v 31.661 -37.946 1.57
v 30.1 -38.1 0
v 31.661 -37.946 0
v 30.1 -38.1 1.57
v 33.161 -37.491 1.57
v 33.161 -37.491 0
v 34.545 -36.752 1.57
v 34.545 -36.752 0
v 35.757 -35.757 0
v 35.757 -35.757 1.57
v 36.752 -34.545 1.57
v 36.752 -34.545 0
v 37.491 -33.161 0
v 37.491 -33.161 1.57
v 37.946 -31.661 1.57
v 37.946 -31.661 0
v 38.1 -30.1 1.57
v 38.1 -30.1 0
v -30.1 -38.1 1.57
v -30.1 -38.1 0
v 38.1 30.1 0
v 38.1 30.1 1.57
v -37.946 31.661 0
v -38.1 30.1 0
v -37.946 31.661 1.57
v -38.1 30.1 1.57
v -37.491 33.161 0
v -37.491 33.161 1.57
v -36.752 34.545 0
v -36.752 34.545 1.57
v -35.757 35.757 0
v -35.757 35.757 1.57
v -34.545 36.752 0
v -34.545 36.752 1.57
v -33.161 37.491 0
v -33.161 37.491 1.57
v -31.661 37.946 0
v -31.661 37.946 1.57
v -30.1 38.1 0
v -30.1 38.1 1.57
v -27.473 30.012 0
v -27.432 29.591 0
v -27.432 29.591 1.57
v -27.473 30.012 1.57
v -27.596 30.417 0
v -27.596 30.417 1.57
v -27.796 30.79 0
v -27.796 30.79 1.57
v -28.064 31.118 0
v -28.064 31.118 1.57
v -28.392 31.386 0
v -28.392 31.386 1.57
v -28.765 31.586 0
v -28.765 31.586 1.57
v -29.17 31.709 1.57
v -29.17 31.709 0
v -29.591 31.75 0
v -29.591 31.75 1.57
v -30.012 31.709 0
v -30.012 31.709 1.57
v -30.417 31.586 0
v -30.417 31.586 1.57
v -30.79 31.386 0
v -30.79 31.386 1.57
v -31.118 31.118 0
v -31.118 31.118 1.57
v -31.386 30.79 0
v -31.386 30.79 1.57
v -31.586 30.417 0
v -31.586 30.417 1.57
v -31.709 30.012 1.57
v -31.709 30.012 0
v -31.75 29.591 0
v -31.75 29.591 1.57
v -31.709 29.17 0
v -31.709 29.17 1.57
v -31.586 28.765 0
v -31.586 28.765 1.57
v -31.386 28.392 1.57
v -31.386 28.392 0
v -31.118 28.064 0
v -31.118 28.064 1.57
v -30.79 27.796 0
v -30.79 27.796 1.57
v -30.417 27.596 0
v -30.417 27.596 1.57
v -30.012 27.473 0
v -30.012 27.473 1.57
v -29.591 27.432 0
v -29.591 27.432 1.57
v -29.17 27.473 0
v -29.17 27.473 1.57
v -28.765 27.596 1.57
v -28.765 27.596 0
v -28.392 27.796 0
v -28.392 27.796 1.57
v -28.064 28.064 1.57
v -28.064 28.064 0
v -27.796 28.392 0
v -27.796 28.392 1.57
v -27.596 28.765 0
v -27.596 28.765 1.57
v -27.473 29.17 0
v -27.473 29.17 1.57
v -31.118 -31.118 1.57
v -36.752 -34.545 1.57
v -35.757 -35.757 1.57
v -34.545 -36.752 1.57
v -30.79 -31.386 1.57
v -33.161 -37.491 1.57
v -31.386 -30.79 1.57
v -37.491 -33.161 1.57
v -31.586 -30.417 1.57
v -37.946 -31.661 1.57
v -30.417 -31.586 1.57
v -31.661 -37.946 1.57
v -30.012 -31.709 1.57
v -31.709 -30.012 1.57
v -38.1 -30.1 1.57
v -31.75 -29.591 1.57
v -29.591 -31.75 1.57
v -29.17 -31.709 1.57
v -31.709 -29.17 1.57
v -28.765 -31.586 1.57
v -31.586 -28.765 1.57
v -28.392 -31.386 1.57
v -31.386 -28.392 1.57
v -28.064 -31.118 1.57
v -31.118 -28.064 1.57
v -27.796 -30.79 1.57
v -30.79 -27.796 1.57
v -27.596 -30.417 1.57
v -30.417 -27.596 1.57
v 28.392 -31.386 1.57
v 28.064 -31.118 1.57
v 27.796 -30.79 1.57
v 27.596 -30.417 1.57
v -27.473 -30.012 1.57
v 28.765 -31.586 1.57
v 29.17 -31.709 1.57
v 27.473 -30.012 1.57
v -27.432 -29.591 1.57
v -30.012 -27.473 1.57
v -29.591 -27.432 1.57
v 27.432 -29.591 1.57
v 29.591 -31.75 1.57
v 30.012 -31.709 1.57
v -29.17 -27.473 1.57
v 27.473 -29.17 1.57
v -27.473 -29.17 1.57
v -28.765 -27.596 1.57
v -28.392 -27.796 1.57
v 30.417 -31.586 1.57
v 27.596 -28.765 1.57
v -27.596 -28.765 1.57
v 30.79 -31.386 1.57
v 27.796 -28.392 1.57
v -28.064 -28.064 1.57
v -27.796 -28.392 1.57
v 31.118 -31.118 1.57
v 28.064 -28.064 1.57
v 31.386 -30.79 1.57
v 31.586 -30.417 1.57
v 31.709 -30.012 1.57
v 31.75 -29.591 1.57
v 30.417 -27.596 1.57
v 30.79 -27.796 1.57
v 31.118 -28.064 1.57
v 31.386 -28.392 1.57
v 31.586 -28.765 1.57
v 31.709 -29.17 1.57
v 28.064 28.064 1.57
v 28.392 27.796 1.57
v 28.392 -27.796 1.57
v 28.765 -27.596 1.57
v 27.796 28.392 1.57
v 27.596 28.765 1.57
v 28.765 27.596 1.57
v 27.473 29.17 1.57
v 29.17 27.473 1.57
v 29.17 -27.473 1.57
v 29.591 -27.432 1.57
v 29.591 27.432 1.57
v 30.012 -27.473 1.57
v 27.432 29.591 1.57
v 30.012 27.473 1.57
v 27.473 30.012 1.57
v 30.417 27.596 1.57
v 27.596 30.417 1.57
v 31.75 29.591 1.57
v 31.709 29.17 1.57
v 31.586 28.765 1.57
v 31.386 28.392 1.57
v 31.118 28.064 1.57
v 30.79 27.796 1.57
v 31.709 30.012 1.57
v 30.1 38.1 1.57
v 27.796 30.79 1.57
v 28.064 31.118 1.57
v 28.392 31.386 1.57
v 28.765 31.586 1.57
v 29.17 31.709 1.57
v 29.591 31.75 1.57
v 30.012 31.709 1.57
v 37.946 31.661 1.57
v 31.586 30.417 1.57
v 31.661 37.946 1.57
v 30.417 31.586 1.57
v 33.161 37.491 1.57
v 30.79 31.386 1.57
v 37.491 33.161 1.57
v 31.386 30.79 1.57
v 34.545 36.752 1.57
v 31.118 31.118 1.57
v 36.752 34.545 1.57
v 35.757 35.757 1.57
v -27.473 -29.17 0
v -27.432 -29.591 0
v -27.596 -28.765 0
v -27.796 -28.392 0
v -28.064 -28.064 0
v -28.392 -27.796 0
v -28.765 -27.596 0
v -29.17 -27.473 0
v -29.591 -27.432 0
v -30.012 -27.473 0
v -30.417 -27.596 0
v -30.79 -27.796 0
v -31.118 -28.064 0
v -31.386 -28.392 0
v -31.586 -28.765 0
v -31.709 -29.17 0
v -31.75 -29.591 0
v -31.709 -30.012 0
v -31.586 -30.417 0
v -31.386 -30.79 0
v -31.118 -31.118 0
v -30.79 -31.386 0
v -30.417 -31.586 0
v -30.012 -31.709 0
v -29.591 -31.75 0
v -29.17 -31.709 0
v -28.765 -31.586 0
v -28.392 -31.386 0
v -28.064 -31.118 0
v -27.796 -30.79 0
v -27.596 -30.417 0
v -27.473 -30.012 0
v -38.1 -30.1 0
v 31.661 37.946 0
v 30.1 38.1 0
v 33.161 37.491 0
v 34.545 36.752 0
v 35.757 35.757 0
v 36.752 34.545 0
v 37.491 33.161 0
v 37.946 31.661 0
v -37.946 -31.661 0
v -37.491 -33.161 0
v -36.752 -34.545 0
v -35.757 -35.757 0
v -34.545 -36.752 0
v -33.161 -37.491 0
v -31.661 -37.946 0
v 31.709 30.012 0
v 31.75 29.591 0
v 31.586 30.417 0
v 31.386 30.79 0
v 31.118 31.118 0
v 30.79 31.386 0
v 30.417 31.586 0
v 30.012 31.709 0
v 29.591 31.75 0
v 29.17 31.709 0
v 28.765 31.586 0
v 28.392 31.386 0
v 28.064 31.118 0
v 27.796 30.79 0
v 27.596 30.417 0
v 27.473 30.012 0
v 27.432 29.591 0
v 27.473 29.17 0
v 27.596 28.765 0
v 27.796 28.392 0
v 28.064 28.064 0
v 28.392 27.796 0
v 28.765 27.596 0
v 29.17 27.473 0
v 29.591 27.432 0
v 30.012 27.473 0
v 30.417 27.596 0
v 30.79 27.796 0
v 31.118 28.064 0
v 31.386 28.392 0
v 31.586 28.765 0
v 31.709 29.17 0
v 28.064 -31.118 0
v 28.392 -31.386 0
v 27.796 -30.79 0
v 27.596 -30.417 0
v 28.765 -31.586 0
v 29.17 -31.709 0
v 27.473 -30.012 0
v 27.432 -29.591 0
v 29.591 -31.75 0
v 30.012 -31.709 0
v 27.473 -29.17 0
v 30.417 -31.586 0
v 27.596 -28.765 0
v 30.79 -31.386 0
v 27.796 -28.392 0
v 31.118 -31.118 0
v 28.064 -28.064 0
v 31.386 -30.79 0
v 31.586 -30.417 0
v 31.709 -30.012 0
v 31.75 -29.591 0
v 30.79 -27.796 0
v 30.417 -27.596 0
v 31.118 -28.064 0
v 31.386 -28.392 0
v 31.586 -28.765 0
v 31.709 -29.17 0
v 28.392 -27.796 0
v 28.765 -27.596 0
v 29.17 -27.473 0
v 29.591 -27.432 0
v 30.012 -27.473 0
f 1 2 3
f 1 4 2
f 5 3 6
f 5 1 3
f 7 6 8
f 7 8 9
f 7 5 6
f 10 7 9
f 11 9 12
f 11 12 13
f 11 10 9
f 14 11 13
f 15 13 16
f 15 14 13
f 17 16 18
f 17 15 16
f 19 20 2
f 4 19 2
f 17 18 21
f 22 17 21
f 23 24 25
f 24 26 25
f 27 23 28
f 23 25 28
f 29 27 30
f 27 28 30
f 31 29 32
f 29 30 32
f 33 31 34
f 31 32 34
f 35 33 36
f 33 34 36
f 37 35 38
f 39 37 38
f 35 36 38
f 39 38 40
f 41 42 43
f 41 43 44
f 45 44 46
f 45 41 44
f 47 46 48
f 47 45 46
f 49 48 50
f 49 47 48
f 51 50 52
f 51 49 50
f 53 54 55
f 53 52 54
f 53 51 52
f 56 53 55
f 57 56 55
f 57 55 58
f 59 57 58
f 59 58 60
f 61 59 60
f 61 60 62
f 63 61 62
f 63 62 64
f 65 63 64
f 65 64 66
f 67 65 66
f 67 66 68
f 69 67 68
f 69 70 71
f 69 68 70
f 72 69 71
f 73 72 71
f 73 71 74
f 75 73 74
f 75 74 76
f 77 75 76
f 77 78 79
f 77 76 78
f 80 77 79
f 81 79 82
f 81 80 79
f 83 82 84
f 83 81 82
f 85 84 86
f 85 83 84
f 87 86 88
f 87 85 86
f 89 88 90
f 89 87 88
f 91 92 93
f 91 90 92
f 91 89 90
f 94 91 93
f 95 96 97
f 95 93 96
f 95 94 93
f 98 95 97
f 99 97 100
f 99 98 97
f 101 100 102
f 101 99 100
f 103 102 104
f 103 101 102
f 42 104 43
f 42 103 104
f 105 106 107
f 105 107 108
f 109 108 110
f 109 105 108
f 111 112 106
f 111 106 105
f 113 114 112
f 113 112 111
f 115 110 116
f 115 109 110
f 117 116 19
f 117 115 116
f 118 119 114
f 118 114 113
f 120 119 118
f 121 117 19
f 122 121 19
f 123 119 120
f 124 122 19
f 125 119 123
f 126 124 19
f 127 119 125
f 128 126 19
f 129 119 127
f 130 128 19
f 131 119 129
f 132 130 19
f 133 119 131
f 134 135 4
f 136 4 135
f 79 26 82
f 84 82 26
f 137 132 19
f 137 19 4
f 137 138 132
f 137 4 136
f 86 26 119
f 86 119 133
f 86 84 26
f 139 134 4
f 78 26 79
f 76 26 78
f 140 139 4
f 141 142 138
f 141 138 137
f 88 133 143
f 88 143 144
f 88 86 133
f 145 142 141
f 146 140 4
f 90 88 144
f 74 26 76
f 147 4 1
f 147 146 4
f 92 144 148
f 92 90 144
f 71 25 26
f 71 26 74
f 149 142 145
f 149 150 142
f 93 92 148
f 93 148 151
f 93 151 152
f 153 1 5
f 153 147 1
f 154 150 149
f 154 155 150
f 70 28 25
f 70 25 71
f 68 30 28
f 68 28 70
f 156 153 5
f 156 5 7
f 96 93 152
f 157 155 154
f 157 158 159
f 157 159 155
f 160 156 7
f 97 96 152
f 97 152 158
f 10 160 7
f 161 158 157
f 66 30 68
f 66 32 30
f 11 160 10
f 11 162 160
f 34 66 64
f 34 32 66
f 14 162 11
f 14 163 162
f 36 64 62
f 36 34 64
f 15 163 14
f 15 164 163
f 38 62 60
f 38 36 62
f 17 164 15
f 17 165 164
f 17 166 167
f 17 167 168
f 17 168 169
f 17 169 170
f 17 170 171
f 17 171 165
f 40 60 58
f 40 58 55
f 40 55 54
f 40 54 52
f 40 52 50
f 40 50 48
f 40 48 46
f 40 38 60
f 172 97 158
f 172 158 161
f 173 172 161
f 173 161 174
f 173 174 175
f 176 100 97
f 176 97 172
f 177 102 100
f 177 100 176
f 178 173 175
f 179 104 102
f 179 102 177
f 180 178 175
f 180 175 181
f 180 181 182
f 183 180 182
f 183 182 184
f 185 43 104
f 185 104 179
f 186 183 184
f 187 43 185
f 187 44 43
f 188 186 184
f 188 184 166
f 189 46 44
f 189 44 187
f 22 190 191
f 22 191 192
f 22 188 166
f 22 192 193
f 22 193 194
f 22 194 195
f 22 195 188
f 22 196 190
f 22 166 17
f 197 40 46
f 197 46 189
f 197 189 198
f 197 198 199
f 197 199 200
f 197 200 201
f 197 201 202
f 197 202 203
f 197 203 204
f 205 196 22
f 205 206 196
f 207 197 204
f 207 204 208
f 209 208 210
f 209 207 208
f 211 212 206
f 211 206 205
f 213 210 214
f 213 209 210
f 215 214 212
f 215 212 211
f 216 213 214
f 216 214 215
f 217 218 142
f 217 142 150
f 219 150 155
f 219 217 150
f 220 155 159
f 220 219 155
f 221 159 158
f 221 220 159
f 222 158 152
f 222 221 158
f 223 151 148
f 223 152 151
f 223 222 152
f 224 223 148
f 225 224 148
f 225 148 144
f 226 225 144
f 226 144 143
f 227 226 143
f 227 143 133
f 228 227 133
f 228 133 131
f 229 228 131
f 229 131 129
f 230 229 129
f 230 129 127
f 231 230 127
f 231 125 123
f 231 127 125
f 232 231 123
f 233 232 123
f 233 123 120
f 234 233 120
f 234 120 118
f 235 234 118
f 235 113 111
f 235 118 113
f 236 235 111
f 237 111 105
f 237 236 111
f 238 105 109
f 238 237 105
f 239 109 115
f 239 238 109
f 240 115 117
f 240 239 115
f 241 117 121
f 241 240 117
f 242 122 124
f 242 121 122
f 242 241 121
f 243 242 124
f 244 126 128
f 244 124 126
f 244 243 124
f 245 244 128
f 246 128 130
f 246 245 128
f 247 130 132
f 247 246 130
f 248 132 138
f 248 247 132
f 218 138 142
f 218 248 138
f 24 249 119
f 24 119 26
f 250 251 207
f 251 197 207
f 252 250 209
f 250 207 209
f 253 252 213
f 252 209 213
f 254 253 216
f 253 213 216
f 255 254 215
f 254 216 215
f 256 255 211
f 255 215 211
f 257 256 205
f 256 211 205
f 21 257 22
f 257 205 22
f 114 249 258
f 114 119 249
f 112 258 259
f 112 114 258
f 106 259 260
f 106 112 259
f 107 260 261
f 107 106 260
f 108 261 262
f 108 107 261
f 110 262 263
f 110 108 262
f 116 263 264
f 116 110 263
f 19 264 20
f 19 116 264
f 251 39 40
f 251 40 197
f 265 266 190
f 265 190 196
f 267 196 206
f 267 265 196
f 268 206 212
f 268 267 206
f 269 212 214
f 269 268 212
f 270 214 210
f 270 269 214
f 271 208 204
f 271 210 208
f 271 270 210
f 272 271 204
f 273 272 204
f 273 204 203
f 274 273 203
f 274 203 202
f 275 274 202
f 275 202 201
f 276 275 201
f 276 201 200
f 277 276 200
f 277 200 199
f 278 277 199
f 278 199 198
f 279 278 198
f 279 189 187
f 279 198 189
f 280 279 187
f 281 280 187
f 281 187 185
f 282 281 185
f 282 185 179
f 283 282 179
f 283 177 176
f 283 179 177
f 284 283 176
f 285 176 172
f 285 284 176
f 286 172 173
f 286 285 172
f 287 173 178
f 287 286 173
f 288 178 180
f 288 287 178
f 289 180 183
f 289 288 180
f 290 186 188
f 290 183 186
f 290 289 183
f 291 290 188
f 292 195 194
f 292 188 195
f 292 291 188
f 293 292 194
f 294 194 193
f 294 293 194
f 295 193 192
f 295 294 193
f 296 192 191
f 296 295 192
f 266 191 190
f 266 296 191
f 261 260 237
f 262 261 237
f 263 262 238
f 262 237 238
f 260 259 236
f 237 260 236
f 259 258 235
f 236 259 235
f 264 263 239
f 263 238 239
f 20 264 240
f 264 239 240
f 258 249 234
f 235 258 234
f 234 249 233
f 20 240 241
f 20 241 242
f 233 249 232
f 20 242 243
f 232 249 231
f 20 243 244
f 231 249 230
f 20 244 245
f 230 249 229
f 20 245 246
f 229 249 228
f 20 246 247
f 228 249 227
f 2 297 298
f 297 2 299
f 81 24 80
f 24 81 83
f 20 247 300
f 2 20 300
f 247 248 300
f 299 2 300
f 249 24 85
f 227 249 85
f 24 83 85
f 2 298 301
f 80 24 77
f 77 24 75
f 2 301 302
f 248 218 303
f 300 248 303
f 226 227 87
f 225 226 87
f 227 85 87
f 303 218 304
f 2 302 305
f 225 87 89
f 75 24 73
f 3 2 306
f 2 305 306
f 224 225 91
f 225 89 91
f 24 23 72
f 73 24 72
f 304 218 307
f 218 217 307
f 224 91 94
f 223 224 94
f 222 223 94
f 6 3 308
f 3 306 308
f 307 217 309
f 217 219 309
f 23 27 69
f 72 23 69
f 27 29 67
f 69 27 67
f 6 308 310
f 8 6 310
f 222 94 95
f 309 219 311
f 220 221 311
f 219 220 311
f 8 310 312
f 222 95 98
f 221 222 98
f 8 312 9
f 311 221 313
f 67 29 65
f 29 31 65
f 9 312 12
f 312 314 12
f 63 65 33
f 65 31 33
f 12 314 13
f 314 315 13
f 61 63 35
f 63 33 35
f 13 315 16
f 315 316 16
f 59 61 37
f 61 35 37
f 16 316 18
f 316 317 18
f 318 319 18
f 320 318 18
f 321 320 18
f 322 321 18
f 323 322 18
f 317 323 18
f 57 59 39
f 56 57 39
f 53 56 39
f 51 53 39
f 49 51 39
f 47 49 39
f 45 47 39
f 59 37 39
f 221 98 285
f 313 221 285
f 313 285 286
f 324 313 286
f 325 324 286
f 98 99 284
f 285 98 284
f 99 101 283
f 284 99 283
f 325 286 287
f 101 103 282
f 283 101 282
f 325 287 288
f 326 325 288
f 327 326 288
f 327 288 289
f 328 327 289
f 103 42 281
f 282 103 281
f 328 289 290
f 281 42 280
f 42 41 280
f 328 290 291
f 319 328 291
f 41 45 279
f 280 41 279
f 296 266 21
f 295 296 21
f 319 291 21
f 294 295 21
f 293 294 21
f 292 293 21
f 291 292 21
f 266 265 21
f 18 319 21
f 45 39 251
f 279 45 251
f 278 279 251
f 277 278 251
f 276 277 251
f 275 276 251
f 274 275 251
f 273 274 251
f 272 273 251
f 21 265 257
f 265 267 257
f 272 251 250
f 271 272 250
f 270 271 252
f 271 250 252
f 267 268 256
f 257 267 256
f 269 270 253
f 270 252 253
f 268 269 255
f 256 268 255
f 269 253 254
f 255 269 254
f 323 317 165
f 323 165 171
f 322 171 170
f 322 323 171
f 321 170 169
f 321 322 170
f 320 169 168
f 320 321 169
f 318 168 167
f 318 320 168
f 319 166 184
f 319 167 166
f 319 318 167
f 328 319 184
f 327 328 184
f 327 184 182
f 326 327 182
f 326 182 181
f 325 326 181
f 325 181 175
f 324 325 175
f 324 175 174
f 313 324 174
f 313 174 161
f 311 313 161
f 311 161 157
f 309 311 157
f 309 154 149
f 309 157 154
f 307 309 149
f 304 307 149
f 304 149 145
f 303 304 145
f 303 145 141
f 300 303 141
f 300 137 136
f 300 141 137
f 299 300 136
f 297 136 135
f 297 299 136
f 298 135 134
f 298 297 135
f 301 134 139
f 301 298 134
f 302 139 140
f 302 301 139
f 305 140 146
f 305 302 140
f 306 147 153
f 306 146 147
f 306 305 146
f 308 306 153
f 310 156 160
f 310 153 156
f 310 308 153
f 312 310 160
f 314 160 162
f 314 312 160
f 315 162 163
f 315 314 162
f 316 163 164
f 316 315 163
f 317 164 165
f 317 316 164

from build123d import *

# Parameters (mm, degrees)
SKETCH1_W               = 76.2
SKETCH1_H               = 76.2
BOSS_EXTRUDE1_DEPTH     = 1.57
CUT_EXTRUDE1_DEPTH      = 16
CUT_EXTRUDE1_DEPTH_BACK = 10.57
SKETCH1_4_R             = 2.159
CUT_EXTRUDE2_DEPTH      = 24
CUT_EXTRUDE2_DEPTH_BACK = 19.57
SKETCH1_5_R             = 2.159
FILLET1_R               = 8


with BuildPart() as part:
    # Sketch1 → Boss-Extrude1 (new body)
    with BuildSketch(Plane.XY):
        Rectangle(SKETCH1_W, SKETCH1_H)
    extrude(amount=BOSS_EXTRUDE1_DEPTH)

    # Sketch1_4 → Cut-Extrude1 (cut, two sides: drawn at the far end of the back side and taken through both)
    with BuildSketch(Plane.XY.offset(-CUT_EXTRUDE1_DEPTH_BACK)):
        with Locations((29.591, 29.591)):
            Circle(SKETCH1_4_R)
    extrude(amount=CUT_EXTRUDE1_DEPTH + CUT_EXTRUDE1_DEPTH_BACK, mode=Mode.SUBTRACT)

    # Sketch1_5 → Cut-Extrude2 (cut, two sides: drawn at the far end of the back side and taken through both)
    with BuildSketch(Plane.XY.offset(-CUT_EXTRUDE2_DEPTH_BACK)):
        with Locations((-29.591, 29.591)):
            Circle(SKETCH1_5_R)
        with Locations((-29.591, -29.591)):
            Circle(SKETCH1_5_R)
        with Locations((29.591, -29.591)):
            Circle(SKETCH1_5_R)
    extrude(amount=CUT_EXTRUDE2_DEPTH + CUT_EXTRUDE2_DEPTH_BACK, mode=Mode.SUBTRACT)

    # Fillet1
    fillet1_edges = [part.edges().sort_by_distance(p)[0] for p in [
        (-38.1, 38.1, 0.785),
        (38.1, 38.1, 0.785),
        (38.1, -38.1, 0.785),
        (-38.1, -38.1, 0.785),
    ]]
    fillet(fillet1_edges, radius=FILLET1_R)


solid = part.part
